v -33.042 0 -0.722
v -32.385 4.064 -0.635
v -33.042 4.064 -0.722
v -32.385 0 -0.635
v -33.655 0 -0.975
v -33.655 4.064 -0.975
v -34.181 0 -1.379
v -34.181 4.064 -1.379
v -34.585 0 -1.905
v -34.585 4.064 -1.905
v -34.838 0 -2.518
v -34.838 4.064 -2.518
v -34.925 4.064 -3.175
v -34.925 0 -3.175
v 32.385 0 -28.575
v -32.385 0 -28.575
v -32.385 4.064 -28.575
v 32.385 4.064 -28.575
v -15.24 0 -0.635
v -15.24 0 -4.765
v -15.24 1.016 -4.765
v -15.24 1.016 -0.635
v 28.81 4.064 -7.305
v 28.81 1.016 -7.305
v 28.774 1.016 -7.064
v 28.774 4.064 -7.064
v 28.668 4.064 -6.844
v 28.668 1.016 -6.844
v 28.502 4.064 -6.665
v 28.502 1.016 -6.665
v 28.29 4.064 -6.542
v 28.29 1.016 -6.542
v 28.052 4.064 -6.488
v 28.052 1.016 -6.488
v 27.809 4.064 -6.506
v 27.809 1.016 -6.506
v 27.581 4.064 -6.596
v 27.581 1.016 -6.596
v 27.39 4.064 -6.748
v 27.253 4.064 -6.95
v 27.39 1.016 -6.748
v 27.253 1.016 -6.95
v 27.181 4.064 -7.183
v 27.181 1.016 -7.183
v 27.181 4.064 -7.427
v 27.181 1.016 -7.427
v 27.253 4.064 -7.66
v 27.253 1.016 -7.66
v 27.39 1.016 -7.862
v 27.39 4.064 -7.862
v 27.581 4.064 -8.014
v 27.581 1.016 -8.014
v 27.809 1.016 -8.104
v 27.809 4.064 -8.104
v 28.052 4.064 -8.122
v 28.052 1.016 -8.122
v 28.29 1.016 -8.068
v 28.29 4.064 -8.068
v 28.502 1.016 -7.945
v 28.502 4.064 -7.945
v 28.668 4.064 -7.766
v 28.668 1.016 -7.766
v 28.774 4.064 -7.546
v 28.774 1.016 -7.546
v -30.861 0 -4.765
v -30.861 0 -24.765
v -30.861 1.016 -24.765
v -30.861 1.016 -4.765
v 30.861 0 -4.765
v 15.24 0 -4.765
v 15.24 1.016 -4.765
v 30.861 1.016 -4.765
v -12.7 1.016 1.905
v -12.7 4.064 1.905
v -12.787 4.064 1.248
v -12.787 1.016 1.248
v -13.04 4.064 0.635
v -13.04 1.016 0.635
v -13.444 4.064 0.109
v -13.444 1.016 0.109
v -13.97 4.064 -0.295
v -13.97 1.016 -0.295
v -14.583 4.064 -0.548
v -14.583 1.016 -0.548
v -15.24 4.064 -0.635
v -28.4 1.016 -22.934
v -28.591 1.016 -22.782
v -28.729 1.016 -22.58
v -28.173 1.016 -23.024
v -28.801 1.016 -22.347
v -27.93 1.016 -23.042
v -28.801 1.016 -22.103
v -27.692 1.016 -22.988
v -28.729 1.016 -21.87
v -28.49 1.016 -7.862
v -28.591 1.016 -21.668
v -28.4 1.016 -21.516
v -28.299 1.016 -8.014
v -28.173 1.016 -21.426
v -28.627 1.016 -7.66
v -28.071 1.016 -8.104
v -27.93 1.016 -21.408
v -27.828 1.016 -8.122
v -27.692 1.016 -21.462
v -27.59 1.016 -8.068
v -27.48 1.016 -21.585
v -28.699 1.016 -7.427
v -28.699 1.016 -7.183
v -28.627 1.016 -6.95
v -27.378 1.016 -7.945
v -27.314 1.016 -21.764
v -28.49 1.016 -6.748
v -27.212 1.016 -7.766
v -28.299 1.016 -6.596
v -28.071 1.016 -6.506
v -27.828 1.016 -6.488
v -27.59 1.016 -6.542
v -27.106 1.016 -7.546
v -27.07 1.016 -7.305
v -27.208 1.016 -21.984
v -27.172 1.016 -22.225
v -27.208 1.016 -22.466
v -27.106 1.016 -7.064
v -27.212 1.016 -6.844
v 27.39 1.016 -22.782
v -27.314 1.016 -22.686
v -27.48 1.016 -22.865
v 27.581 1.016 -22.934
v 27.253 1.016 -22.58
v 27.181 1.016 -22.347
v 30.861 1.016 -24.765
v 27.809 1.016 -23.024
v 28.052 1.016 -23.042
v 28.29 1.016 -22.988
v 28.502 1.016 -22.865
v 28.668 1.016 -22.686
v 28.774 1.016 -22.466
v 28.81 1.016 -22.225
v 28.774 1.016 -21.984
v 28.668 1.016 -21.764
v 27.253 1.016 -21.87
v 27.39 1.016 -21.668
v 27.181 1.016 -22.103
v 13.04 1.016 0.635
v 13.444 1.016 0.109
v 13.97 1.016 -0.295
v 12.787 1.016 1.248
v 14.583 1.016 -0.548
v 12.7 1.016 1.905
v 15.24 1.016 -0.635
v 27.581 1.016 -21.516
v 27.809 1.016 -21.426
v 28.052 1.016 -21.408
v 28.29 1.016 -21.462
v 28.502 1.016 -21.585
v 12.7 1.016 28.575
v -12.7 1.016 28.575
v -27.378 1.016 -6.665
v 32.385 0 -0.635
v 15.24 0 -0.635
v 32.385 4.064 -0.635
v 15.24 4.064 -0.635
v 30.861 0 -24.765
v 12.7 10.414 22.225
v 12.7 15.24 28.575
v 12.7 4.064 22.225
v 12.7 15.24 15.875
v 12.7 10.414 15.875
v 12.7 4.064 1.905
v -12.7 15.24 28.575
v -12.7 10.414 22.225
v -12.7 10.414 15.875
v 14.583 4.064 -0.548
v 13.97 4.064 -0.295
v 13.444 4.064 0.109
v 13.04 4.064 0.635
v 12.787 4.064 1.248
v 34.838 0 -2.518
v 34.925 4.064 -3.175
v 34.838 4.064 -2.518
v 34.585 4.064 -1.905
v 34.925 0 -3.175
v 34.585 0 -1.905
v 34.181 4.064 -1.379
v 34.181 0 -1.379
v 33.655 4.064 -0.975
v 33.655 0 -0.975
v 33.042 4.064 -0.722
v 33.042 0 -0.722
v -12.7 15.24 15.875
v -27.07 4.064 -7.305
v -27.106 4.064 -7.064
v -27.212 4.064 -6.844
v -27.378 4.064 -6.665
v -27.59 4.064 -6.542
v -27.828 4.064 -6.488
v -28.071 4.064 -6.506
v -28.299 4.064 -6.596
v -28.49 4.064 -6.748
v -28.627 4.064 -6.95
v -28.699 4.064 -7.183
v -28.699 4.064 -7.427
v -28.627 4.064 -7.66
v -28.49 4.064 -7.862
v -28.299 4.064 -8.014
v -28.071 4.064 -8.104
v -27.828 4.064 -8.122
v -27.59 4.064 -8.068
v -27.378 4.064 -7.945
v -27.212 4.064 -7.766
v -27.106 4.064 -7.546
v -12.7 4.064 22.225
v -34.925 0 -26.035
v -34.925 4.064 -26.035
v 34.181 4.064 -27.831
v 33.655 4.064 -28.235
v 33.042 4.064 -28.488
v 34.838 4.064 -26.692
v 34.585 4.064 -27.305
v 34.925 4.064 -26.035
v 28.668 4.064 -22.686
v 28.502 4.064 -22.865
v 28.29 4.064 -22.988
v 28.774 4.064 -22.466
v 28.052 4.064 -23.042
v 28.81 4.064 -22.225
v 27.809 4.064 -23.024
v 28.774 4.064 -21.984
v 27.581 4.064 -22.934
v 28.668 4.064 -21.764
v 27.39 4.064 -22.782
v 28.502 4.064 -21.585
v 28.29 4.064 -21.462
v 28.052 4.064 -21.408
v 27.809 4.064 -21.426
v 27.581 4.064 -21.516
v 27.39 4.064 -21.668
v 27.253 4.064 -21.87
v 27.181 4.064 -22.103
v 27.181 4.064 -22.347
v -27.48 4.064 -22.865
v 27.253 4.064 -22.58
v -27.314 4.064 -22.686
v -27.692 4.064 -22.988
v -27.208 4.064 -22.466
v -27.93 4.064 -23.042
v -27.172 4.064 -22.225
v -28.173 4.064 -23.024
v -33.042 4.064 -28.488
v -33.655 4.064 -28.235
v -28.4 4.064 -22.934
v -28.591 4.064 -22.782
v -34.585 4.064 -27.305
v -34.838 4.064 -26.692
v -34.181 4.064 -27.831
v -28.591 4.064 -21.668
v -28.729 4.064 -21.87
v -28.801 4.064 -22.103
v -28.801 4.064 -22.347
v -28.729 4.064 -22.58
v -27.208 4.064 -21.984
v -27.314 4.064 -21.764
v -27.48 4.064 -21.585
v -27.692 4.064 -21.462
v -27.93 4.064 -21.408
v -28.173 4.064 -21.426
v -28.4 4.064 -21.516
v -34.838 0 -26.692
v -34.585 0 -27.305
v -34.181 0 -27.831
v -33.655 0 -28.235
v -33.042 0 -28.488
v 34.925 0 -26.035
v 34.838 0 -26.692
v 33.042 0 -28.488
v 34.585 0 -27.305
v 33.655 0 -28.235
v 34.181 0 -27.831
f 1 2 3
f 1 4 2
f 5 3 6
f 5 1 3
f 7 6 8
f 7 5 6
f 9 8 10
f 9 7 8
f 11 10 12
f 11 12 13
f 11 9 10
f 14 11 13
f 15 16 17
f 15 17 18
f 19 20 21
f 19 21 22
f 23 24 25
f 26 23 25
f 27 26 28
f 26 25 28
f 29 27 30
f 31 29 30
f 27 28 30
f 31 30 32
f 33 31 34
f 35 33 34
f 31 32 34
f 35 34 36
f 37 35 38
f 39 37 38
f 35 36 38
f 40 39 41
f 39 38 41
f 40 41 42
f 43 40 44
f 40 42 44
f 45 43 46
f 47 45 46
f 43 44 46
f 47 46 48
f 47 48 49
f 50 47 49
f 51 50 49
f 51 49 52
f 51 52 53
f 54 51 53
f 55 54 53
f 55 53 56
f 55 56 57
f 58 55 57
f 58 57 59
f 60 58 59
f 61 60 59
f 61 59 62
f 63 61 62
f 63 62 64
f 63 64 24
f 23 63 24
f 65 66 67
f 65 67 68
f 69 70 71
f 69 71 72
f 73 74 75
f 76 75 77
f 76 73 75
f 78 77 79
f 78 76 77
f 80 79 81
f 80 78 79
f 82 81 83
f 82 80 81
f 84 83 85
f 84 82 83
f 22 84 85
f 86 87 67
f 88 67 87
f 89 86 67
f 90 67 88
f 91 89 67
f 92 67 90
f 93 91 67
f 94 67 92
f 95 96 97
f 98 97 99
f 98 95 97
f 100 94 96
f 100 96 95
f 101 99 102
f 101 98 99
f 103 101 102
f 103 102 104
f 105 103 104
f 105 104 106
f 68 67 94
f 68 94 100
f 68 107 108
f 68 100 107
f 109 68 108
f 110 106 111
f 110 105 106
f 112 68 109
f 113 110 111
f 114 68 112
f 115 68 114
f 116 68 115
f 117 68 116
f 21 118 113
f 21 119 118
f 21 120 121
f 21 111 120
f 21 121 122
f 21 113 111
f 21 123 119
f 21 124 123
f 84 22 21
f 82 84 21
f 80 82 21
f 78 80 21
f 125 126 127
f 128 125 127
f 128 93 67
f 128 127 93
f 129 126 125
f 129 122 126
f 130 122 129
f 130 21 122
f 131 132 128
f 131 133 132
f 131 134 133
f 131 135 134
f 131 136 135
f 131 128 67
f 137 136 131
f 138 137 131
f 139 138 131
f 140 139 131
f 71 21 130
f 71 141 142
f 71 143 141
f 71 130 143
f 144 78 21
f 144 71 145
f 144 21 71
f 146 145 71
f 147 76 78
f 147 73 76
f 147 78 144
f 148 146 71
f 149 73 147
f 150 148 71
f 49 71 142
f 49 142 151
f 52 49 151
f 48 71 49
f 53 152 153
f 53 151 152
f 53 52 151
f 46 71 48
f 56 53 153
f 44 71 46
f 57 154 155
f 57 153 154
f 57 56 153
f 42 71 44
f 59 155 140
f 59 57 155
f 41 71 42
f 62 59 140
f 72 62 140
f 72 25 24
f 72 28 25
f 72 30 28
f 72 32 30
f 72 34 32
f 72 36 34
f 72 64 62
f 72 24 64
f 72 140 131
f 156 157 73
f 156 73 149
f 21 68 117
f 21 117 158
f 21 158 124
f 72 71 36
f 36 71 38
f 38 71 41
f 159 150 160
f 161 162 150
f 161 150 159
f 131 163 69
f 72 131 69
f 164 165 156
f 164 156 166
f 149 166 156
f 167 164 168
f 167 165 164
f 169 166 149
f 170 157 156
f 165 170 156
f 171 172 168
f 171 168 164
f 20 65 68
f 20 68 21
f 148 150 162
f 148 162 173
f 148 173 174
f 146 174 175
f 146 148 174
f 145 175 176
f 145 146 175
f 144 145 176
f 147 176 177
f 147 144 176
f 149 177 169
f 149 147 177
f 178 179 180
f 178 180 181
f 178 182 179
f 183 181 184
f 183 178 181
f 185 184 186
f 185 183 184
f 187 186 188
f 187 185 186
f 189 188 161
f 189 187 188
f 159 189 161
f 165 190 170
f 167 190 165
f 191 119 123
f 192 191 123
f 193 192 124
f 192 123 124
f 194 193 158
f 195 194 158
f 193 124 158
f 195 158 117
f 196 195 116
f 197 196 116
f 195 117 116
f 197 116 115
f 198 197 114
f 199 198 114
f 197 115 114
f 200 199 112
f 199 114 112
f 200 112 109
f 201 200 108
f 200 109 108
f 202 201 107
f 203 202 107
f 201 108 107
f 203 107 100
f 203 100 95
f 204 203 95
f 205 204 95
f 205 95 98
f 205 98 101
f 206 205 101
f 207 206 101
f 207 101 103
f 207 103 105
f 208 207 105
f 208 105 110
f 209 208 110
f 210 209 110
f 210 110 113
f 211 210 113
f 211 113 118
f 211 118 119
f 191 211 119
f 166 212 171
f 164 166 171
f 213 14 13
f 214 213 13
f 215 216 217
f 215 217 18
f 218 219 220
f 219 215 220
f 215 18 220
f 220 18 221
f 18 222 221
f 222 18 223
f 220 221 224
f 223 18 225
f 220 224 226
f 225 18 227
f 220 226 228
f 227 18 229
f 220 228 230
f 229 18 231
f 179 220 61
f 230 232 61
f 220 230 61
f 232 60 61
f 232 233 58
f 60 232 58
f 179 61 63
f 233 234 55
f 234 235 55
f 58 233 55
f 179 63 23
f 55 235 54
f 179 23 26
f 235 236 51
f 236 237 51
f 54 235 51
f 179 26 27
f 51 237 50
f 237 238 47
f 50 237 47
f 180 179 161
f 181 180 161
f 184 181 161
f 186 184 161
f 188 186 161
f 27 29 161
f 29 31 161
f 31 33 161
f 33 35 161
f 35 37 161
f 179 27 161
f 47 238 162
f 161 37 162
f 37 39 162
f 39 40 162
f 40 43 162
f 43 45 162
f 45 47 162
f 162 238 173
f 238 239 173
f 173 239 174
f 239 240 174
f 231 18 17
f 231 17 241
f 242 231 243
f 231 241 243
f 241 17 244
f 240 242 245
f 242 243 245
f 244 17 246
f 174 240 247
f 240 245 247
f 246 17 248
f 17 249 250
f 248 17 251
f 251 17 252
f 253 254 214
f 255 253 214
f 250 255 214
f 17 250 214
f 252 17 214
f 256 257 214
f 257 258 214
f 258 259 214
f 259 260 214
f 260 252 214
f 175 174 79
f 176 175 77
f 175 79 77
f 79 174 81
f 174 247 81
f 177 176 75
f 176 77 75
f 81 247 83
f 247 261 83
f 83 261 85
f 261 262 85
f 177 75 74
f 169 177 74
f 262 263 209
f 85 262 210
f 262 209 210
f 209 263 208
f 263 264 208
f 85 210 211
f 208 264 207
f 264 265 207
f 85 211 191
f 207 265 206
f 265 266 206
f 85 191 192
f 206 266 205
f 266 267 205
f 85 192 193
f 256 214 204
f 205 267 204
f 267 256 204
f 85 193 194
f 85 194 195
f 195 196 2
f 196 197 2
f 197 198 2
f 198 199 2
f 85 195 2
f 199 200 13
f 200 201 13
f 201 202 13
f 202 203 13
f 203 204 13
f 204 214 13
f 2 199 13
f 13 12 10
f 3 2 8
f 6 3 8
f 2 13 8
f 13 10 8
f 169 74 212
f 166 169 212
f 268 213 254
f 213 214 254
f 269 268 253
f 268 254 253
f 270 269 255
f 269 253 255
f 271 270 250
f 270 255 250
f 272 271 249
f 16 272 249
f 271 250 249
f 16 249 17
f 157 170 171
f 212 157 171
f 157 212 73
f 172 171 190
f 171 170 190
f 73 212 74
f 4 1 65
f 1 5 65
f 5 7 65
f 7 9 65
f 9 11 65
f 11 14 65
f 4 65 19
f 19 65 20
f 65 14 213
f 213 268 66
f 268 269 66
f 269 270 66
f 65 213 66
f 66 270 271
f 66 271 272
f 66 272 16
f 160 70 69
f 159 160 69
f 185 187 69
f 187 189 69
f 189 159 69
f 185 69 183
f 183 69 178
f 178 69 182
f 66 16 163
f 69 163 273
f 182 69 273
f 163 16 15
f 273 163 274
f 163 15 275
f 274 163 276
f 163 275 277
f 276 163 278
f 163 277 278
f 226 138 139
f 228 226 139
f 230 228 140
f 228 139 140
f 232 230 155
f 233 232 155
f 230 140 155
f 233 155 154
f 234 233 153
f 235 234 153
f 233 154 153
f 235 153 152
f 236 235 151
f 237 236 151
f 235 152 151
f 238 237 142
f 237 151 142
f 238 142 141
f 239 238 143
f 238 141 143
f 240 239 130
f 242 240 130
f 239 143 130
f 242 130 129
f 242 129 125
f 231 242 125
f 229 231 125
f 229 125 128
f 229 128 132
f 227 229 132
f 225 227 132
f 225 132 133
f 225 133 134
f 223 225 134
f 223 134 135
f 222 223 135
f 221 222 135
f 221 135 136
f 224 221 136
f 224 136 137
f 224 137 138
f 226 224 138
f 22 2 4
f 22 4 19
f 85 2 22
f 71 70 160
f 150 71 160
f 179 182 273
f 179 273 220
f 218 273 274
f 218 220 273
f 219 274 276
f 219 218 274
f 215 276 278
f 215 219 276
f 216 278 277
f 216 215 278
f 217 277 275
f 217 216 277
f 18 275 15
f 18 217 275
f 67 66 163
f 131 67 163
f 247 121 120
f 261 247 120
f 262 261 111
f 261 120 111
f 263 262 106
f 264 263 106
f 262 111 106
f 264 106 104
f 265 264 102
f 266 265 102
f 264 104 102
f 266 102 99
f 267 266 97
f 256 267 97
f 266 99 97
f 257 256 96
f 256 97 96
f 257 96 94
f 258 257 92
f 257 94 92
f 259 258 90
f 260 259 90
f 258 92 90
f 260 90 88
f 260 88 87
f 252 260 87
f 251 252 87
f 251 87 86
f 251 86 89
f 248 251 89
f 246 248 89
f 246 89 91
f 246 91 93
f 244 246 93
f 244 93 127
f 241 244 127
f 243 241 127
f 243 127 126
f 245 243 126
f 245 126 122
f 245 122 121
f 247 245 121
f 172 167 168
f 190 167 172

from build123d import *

# Parameters (mm, degrees)
SKETCH1_W                = 69.85
SKETCH1_H                = 57.15
BOSS_EXTRUDE1_DEPTH      = 15.24
SKETCH2_W                = 50.8
SKETCH2_H                = 6.35
CUT_EXTRUDE1_DEPTH       = 69.85
SKETCH3_W                = 44.45
SKETCH3_H                = 4.826
CUT_EXTRUDE2_DEPTH       = 50.8
SKETCH5_W                = 61.722
SKETCH5_H                = 20.0000108
SKETCH5_R                = 0.81915
CUT_EXTRUDE3_DEPTH       = 1.016
SKETCH5_3_R              = 0.81915
CUT_EXTRUDE4_DEPTH       = 16.24
SKETCH7_W                = 69.85
SKETCH7_H                = 6.096
BOSS_EXTRUDE2_DEPTH      = 6.35
SKETCH8_W                = 6.35
SKETCH8_H                = 1.27
CUT_EXTRUDE9_DEPTH       = 1
CUT_EXTRUDE9_DEPTH_BACK  = 70.85
SKETCH17_W               = 22.225
SKETCH17_H               = 4.826
CUT_EXTRUDE13_DEPTH      = 6.35
SKETCH18_W               = 22.225
SKETCH18_H               = 29.21
CUT_EXTRUDE14_DEPTH      = 1
CUT_EXTRUDE14_DEPTH_BACK = 16.24
FILLET1_R                = 2.54
SKETCH19_W               = 30.48
SKETCH19_H               = 33.3399892
CUT_EXTRUDE16_DEPTH      = 1.016


with BuildPart() as part:
    # Sketch1 → Boss-Extrude1 (new body)
    with BuildSketch(Plane(origin=(0, 0, 0), x_dir=(1, 0, 0), z_dir=(0, 1, 0))):
        Rectangle(SKETCH1_W, SKETCH1_H)
    extrude(amount=BOSS_EXTRUDE1_DEPTH)

    # Sketch2 → Cut-Extrude1 (cut)
    with BuildSketch(Plane.ZY.offset(34.925)):
        with Locations((-3.175, 7.239)):
            Rectangle(SKETCH2_W, SKETCH2_H)
    extrude(amount=-CUT_EXTRUDE1_DEPTH, mode=Mode.SUBTRACT)

    # Sketch3 → Cut-Extrude2 (cut)
    with BuildSketch(Plane.ZY.offset(34.925)):
        with Locations((-6.35, 12.827)):
            Rectangle(SKETCH3_W, SKETCH3_H)
    cut_extrude2 = extrude(amount=-CUT_EXTRUDE2_DEPTH, mode=Mode.SUBTRACT)

    # Mirror1: Cut-Extrude2 across plane
    add(cut_extrude2.mirror(Plane(origin=(0, 0, 0), x_dir=(0, 0, 1), z_dir=(1, 0, 0))), mode=Mode.SUBTRACT)

    # Sketch5 → Cut-Extrude3 (cut)
    with BuildSketch(Plane.XZ):
        with Locations((0, -14.7649946)):
            Rectangle(SKETCH5_W, SKETCH5_H)
        with Locations((-27.8892, -7.3049892)):
            Circle(SKETCH5_R, mode=Mode.SUBTRACT)
        with Locations((27.9908, -7.3049892)):
            Circle(SKETCH5_R, mode=Mode.SUBTRACT)
    extrude(amount=-CUT_EXTRUDE3_DEPTH, mode=Mode.SUBTRACT)

    # Sketch5<3> → Cut-Extrude4 (cut, through all)
    with BuildSketch(Plane.XZ):
        with Locations((-27.9908, -22.225)):
            Circle(SKETCH5_3_R)
        with Locations((27.9908, -22.225)):
            Circle(SKETCH5_3_R)
        with Locations((-27.8892, -7.3049892)):
            Circle(SKETCH5_3_R)
        with Locations((27.9908, -7.3049892)):
            Circle(SKETCH5_3_R)
    extrude(amount=-CUT_EXTRUDE4_DEPTH, mode=Mode.SUBTRACT)

    # Sketch7 → Boss-Extrude2 (add)
    with BuildSketch(Plane(origin=(0, 0, 22.225), x_dir=(-1, 0, 0), z_dir=(0, 0, -1))):
        with Locations((0, 12.192)):
            Rectangle(SKETCH7_W, SKETCH7_H)
    extrude(amount=BOSS_EXTRUDE2_DEPTH)

    # Sketch8 → Cut-Extrude9 (cut, two sides)
    with BuildSketch(Plane.ZY.offset(34.925)) as cut_extrude9_sk:
        with Locations((19.05, 9.779)):
            Rectangle(SKETCH8_W, SKETCH8_H)
    extrude(amount=CUT_EXTRUDE9_DEPTH, mode=Mode.SUBTRACT)
    extrude(cut_extrude9_sk.sketch, amount=-CUT_EXTRUDE9_DEPTH_BACK, mode=Mode.SUBTRACT)

    # Sketch17 → Cut-Extrude13 (cut)
    with BuildSketch(Plane(origin=(0, 0, 15.875), x_dir=(-1, 0, 0), z_dir=(0, 0, -1))):
        with Locations((-23.8125, 12.827)):
            Rectangle(SKETCH17_W, SKETCH17_H)
        with Locations((23.8125, 12.827)):
            Rectangle(SKETCH17_W, SKETCH17_H)
    extrude(amount=-CUT_EXTRUDE13_DEPTH, mode=Mode.SUBTRACT)

    # Sketch18 → Cut-Extrude14 (cut, two sides)
    with BuildSketch(Plane(origin=(0, 15.24, 0), x_dir=(1, 0, 0), z_dir=(0, 1, 0))) as cut_extrude14_sk:
        with Locations((-23.8125, -13.97)):
            Rectangle(SKETCH18_W, SKETCH18_H)
        with Locations((23.8125, -13.97)):
            Rectangle(SKETCH18_W, SKETCH18_H)
    extrude(amount=CUT_EXTRUDE14_DEPTH, mode=Mode.SUBTRACT)
    extrude(cut_extrude14_sk.sketch, amount=-CUT_EXTRUDE14_DEPTH_BACK, mode=Mode.SUBTRACT)

    # Fillet1
    fillet1_edges = [part.edges().sort_by_distance(p)[0] for p in [
        (-34.925, 2.032, -28.575),
        (34.925, 2.032, -28.575),
        (-34.925, 2.032, -0.635),
        (-12.7, 2.032, -0.635),
        (34.925, 2.032, -0.635),
        (12.7, 2.032, -0.635),
    ]]
    fillet(fillet1_edges, radius=FILLET1_R)

    # Sketch19 → Cut-Extrude16 (cut)
    with BuildSketch(Plane.XZ):
        with Locations((0, 11.9050054)):
            Rectangle(SKETCH19_W, SKETCH19_H)
    extrude(amount=-CUT_EXTRUDE16_DEPTH, mode=Mode.SUBTRACT)


solid = part.part
